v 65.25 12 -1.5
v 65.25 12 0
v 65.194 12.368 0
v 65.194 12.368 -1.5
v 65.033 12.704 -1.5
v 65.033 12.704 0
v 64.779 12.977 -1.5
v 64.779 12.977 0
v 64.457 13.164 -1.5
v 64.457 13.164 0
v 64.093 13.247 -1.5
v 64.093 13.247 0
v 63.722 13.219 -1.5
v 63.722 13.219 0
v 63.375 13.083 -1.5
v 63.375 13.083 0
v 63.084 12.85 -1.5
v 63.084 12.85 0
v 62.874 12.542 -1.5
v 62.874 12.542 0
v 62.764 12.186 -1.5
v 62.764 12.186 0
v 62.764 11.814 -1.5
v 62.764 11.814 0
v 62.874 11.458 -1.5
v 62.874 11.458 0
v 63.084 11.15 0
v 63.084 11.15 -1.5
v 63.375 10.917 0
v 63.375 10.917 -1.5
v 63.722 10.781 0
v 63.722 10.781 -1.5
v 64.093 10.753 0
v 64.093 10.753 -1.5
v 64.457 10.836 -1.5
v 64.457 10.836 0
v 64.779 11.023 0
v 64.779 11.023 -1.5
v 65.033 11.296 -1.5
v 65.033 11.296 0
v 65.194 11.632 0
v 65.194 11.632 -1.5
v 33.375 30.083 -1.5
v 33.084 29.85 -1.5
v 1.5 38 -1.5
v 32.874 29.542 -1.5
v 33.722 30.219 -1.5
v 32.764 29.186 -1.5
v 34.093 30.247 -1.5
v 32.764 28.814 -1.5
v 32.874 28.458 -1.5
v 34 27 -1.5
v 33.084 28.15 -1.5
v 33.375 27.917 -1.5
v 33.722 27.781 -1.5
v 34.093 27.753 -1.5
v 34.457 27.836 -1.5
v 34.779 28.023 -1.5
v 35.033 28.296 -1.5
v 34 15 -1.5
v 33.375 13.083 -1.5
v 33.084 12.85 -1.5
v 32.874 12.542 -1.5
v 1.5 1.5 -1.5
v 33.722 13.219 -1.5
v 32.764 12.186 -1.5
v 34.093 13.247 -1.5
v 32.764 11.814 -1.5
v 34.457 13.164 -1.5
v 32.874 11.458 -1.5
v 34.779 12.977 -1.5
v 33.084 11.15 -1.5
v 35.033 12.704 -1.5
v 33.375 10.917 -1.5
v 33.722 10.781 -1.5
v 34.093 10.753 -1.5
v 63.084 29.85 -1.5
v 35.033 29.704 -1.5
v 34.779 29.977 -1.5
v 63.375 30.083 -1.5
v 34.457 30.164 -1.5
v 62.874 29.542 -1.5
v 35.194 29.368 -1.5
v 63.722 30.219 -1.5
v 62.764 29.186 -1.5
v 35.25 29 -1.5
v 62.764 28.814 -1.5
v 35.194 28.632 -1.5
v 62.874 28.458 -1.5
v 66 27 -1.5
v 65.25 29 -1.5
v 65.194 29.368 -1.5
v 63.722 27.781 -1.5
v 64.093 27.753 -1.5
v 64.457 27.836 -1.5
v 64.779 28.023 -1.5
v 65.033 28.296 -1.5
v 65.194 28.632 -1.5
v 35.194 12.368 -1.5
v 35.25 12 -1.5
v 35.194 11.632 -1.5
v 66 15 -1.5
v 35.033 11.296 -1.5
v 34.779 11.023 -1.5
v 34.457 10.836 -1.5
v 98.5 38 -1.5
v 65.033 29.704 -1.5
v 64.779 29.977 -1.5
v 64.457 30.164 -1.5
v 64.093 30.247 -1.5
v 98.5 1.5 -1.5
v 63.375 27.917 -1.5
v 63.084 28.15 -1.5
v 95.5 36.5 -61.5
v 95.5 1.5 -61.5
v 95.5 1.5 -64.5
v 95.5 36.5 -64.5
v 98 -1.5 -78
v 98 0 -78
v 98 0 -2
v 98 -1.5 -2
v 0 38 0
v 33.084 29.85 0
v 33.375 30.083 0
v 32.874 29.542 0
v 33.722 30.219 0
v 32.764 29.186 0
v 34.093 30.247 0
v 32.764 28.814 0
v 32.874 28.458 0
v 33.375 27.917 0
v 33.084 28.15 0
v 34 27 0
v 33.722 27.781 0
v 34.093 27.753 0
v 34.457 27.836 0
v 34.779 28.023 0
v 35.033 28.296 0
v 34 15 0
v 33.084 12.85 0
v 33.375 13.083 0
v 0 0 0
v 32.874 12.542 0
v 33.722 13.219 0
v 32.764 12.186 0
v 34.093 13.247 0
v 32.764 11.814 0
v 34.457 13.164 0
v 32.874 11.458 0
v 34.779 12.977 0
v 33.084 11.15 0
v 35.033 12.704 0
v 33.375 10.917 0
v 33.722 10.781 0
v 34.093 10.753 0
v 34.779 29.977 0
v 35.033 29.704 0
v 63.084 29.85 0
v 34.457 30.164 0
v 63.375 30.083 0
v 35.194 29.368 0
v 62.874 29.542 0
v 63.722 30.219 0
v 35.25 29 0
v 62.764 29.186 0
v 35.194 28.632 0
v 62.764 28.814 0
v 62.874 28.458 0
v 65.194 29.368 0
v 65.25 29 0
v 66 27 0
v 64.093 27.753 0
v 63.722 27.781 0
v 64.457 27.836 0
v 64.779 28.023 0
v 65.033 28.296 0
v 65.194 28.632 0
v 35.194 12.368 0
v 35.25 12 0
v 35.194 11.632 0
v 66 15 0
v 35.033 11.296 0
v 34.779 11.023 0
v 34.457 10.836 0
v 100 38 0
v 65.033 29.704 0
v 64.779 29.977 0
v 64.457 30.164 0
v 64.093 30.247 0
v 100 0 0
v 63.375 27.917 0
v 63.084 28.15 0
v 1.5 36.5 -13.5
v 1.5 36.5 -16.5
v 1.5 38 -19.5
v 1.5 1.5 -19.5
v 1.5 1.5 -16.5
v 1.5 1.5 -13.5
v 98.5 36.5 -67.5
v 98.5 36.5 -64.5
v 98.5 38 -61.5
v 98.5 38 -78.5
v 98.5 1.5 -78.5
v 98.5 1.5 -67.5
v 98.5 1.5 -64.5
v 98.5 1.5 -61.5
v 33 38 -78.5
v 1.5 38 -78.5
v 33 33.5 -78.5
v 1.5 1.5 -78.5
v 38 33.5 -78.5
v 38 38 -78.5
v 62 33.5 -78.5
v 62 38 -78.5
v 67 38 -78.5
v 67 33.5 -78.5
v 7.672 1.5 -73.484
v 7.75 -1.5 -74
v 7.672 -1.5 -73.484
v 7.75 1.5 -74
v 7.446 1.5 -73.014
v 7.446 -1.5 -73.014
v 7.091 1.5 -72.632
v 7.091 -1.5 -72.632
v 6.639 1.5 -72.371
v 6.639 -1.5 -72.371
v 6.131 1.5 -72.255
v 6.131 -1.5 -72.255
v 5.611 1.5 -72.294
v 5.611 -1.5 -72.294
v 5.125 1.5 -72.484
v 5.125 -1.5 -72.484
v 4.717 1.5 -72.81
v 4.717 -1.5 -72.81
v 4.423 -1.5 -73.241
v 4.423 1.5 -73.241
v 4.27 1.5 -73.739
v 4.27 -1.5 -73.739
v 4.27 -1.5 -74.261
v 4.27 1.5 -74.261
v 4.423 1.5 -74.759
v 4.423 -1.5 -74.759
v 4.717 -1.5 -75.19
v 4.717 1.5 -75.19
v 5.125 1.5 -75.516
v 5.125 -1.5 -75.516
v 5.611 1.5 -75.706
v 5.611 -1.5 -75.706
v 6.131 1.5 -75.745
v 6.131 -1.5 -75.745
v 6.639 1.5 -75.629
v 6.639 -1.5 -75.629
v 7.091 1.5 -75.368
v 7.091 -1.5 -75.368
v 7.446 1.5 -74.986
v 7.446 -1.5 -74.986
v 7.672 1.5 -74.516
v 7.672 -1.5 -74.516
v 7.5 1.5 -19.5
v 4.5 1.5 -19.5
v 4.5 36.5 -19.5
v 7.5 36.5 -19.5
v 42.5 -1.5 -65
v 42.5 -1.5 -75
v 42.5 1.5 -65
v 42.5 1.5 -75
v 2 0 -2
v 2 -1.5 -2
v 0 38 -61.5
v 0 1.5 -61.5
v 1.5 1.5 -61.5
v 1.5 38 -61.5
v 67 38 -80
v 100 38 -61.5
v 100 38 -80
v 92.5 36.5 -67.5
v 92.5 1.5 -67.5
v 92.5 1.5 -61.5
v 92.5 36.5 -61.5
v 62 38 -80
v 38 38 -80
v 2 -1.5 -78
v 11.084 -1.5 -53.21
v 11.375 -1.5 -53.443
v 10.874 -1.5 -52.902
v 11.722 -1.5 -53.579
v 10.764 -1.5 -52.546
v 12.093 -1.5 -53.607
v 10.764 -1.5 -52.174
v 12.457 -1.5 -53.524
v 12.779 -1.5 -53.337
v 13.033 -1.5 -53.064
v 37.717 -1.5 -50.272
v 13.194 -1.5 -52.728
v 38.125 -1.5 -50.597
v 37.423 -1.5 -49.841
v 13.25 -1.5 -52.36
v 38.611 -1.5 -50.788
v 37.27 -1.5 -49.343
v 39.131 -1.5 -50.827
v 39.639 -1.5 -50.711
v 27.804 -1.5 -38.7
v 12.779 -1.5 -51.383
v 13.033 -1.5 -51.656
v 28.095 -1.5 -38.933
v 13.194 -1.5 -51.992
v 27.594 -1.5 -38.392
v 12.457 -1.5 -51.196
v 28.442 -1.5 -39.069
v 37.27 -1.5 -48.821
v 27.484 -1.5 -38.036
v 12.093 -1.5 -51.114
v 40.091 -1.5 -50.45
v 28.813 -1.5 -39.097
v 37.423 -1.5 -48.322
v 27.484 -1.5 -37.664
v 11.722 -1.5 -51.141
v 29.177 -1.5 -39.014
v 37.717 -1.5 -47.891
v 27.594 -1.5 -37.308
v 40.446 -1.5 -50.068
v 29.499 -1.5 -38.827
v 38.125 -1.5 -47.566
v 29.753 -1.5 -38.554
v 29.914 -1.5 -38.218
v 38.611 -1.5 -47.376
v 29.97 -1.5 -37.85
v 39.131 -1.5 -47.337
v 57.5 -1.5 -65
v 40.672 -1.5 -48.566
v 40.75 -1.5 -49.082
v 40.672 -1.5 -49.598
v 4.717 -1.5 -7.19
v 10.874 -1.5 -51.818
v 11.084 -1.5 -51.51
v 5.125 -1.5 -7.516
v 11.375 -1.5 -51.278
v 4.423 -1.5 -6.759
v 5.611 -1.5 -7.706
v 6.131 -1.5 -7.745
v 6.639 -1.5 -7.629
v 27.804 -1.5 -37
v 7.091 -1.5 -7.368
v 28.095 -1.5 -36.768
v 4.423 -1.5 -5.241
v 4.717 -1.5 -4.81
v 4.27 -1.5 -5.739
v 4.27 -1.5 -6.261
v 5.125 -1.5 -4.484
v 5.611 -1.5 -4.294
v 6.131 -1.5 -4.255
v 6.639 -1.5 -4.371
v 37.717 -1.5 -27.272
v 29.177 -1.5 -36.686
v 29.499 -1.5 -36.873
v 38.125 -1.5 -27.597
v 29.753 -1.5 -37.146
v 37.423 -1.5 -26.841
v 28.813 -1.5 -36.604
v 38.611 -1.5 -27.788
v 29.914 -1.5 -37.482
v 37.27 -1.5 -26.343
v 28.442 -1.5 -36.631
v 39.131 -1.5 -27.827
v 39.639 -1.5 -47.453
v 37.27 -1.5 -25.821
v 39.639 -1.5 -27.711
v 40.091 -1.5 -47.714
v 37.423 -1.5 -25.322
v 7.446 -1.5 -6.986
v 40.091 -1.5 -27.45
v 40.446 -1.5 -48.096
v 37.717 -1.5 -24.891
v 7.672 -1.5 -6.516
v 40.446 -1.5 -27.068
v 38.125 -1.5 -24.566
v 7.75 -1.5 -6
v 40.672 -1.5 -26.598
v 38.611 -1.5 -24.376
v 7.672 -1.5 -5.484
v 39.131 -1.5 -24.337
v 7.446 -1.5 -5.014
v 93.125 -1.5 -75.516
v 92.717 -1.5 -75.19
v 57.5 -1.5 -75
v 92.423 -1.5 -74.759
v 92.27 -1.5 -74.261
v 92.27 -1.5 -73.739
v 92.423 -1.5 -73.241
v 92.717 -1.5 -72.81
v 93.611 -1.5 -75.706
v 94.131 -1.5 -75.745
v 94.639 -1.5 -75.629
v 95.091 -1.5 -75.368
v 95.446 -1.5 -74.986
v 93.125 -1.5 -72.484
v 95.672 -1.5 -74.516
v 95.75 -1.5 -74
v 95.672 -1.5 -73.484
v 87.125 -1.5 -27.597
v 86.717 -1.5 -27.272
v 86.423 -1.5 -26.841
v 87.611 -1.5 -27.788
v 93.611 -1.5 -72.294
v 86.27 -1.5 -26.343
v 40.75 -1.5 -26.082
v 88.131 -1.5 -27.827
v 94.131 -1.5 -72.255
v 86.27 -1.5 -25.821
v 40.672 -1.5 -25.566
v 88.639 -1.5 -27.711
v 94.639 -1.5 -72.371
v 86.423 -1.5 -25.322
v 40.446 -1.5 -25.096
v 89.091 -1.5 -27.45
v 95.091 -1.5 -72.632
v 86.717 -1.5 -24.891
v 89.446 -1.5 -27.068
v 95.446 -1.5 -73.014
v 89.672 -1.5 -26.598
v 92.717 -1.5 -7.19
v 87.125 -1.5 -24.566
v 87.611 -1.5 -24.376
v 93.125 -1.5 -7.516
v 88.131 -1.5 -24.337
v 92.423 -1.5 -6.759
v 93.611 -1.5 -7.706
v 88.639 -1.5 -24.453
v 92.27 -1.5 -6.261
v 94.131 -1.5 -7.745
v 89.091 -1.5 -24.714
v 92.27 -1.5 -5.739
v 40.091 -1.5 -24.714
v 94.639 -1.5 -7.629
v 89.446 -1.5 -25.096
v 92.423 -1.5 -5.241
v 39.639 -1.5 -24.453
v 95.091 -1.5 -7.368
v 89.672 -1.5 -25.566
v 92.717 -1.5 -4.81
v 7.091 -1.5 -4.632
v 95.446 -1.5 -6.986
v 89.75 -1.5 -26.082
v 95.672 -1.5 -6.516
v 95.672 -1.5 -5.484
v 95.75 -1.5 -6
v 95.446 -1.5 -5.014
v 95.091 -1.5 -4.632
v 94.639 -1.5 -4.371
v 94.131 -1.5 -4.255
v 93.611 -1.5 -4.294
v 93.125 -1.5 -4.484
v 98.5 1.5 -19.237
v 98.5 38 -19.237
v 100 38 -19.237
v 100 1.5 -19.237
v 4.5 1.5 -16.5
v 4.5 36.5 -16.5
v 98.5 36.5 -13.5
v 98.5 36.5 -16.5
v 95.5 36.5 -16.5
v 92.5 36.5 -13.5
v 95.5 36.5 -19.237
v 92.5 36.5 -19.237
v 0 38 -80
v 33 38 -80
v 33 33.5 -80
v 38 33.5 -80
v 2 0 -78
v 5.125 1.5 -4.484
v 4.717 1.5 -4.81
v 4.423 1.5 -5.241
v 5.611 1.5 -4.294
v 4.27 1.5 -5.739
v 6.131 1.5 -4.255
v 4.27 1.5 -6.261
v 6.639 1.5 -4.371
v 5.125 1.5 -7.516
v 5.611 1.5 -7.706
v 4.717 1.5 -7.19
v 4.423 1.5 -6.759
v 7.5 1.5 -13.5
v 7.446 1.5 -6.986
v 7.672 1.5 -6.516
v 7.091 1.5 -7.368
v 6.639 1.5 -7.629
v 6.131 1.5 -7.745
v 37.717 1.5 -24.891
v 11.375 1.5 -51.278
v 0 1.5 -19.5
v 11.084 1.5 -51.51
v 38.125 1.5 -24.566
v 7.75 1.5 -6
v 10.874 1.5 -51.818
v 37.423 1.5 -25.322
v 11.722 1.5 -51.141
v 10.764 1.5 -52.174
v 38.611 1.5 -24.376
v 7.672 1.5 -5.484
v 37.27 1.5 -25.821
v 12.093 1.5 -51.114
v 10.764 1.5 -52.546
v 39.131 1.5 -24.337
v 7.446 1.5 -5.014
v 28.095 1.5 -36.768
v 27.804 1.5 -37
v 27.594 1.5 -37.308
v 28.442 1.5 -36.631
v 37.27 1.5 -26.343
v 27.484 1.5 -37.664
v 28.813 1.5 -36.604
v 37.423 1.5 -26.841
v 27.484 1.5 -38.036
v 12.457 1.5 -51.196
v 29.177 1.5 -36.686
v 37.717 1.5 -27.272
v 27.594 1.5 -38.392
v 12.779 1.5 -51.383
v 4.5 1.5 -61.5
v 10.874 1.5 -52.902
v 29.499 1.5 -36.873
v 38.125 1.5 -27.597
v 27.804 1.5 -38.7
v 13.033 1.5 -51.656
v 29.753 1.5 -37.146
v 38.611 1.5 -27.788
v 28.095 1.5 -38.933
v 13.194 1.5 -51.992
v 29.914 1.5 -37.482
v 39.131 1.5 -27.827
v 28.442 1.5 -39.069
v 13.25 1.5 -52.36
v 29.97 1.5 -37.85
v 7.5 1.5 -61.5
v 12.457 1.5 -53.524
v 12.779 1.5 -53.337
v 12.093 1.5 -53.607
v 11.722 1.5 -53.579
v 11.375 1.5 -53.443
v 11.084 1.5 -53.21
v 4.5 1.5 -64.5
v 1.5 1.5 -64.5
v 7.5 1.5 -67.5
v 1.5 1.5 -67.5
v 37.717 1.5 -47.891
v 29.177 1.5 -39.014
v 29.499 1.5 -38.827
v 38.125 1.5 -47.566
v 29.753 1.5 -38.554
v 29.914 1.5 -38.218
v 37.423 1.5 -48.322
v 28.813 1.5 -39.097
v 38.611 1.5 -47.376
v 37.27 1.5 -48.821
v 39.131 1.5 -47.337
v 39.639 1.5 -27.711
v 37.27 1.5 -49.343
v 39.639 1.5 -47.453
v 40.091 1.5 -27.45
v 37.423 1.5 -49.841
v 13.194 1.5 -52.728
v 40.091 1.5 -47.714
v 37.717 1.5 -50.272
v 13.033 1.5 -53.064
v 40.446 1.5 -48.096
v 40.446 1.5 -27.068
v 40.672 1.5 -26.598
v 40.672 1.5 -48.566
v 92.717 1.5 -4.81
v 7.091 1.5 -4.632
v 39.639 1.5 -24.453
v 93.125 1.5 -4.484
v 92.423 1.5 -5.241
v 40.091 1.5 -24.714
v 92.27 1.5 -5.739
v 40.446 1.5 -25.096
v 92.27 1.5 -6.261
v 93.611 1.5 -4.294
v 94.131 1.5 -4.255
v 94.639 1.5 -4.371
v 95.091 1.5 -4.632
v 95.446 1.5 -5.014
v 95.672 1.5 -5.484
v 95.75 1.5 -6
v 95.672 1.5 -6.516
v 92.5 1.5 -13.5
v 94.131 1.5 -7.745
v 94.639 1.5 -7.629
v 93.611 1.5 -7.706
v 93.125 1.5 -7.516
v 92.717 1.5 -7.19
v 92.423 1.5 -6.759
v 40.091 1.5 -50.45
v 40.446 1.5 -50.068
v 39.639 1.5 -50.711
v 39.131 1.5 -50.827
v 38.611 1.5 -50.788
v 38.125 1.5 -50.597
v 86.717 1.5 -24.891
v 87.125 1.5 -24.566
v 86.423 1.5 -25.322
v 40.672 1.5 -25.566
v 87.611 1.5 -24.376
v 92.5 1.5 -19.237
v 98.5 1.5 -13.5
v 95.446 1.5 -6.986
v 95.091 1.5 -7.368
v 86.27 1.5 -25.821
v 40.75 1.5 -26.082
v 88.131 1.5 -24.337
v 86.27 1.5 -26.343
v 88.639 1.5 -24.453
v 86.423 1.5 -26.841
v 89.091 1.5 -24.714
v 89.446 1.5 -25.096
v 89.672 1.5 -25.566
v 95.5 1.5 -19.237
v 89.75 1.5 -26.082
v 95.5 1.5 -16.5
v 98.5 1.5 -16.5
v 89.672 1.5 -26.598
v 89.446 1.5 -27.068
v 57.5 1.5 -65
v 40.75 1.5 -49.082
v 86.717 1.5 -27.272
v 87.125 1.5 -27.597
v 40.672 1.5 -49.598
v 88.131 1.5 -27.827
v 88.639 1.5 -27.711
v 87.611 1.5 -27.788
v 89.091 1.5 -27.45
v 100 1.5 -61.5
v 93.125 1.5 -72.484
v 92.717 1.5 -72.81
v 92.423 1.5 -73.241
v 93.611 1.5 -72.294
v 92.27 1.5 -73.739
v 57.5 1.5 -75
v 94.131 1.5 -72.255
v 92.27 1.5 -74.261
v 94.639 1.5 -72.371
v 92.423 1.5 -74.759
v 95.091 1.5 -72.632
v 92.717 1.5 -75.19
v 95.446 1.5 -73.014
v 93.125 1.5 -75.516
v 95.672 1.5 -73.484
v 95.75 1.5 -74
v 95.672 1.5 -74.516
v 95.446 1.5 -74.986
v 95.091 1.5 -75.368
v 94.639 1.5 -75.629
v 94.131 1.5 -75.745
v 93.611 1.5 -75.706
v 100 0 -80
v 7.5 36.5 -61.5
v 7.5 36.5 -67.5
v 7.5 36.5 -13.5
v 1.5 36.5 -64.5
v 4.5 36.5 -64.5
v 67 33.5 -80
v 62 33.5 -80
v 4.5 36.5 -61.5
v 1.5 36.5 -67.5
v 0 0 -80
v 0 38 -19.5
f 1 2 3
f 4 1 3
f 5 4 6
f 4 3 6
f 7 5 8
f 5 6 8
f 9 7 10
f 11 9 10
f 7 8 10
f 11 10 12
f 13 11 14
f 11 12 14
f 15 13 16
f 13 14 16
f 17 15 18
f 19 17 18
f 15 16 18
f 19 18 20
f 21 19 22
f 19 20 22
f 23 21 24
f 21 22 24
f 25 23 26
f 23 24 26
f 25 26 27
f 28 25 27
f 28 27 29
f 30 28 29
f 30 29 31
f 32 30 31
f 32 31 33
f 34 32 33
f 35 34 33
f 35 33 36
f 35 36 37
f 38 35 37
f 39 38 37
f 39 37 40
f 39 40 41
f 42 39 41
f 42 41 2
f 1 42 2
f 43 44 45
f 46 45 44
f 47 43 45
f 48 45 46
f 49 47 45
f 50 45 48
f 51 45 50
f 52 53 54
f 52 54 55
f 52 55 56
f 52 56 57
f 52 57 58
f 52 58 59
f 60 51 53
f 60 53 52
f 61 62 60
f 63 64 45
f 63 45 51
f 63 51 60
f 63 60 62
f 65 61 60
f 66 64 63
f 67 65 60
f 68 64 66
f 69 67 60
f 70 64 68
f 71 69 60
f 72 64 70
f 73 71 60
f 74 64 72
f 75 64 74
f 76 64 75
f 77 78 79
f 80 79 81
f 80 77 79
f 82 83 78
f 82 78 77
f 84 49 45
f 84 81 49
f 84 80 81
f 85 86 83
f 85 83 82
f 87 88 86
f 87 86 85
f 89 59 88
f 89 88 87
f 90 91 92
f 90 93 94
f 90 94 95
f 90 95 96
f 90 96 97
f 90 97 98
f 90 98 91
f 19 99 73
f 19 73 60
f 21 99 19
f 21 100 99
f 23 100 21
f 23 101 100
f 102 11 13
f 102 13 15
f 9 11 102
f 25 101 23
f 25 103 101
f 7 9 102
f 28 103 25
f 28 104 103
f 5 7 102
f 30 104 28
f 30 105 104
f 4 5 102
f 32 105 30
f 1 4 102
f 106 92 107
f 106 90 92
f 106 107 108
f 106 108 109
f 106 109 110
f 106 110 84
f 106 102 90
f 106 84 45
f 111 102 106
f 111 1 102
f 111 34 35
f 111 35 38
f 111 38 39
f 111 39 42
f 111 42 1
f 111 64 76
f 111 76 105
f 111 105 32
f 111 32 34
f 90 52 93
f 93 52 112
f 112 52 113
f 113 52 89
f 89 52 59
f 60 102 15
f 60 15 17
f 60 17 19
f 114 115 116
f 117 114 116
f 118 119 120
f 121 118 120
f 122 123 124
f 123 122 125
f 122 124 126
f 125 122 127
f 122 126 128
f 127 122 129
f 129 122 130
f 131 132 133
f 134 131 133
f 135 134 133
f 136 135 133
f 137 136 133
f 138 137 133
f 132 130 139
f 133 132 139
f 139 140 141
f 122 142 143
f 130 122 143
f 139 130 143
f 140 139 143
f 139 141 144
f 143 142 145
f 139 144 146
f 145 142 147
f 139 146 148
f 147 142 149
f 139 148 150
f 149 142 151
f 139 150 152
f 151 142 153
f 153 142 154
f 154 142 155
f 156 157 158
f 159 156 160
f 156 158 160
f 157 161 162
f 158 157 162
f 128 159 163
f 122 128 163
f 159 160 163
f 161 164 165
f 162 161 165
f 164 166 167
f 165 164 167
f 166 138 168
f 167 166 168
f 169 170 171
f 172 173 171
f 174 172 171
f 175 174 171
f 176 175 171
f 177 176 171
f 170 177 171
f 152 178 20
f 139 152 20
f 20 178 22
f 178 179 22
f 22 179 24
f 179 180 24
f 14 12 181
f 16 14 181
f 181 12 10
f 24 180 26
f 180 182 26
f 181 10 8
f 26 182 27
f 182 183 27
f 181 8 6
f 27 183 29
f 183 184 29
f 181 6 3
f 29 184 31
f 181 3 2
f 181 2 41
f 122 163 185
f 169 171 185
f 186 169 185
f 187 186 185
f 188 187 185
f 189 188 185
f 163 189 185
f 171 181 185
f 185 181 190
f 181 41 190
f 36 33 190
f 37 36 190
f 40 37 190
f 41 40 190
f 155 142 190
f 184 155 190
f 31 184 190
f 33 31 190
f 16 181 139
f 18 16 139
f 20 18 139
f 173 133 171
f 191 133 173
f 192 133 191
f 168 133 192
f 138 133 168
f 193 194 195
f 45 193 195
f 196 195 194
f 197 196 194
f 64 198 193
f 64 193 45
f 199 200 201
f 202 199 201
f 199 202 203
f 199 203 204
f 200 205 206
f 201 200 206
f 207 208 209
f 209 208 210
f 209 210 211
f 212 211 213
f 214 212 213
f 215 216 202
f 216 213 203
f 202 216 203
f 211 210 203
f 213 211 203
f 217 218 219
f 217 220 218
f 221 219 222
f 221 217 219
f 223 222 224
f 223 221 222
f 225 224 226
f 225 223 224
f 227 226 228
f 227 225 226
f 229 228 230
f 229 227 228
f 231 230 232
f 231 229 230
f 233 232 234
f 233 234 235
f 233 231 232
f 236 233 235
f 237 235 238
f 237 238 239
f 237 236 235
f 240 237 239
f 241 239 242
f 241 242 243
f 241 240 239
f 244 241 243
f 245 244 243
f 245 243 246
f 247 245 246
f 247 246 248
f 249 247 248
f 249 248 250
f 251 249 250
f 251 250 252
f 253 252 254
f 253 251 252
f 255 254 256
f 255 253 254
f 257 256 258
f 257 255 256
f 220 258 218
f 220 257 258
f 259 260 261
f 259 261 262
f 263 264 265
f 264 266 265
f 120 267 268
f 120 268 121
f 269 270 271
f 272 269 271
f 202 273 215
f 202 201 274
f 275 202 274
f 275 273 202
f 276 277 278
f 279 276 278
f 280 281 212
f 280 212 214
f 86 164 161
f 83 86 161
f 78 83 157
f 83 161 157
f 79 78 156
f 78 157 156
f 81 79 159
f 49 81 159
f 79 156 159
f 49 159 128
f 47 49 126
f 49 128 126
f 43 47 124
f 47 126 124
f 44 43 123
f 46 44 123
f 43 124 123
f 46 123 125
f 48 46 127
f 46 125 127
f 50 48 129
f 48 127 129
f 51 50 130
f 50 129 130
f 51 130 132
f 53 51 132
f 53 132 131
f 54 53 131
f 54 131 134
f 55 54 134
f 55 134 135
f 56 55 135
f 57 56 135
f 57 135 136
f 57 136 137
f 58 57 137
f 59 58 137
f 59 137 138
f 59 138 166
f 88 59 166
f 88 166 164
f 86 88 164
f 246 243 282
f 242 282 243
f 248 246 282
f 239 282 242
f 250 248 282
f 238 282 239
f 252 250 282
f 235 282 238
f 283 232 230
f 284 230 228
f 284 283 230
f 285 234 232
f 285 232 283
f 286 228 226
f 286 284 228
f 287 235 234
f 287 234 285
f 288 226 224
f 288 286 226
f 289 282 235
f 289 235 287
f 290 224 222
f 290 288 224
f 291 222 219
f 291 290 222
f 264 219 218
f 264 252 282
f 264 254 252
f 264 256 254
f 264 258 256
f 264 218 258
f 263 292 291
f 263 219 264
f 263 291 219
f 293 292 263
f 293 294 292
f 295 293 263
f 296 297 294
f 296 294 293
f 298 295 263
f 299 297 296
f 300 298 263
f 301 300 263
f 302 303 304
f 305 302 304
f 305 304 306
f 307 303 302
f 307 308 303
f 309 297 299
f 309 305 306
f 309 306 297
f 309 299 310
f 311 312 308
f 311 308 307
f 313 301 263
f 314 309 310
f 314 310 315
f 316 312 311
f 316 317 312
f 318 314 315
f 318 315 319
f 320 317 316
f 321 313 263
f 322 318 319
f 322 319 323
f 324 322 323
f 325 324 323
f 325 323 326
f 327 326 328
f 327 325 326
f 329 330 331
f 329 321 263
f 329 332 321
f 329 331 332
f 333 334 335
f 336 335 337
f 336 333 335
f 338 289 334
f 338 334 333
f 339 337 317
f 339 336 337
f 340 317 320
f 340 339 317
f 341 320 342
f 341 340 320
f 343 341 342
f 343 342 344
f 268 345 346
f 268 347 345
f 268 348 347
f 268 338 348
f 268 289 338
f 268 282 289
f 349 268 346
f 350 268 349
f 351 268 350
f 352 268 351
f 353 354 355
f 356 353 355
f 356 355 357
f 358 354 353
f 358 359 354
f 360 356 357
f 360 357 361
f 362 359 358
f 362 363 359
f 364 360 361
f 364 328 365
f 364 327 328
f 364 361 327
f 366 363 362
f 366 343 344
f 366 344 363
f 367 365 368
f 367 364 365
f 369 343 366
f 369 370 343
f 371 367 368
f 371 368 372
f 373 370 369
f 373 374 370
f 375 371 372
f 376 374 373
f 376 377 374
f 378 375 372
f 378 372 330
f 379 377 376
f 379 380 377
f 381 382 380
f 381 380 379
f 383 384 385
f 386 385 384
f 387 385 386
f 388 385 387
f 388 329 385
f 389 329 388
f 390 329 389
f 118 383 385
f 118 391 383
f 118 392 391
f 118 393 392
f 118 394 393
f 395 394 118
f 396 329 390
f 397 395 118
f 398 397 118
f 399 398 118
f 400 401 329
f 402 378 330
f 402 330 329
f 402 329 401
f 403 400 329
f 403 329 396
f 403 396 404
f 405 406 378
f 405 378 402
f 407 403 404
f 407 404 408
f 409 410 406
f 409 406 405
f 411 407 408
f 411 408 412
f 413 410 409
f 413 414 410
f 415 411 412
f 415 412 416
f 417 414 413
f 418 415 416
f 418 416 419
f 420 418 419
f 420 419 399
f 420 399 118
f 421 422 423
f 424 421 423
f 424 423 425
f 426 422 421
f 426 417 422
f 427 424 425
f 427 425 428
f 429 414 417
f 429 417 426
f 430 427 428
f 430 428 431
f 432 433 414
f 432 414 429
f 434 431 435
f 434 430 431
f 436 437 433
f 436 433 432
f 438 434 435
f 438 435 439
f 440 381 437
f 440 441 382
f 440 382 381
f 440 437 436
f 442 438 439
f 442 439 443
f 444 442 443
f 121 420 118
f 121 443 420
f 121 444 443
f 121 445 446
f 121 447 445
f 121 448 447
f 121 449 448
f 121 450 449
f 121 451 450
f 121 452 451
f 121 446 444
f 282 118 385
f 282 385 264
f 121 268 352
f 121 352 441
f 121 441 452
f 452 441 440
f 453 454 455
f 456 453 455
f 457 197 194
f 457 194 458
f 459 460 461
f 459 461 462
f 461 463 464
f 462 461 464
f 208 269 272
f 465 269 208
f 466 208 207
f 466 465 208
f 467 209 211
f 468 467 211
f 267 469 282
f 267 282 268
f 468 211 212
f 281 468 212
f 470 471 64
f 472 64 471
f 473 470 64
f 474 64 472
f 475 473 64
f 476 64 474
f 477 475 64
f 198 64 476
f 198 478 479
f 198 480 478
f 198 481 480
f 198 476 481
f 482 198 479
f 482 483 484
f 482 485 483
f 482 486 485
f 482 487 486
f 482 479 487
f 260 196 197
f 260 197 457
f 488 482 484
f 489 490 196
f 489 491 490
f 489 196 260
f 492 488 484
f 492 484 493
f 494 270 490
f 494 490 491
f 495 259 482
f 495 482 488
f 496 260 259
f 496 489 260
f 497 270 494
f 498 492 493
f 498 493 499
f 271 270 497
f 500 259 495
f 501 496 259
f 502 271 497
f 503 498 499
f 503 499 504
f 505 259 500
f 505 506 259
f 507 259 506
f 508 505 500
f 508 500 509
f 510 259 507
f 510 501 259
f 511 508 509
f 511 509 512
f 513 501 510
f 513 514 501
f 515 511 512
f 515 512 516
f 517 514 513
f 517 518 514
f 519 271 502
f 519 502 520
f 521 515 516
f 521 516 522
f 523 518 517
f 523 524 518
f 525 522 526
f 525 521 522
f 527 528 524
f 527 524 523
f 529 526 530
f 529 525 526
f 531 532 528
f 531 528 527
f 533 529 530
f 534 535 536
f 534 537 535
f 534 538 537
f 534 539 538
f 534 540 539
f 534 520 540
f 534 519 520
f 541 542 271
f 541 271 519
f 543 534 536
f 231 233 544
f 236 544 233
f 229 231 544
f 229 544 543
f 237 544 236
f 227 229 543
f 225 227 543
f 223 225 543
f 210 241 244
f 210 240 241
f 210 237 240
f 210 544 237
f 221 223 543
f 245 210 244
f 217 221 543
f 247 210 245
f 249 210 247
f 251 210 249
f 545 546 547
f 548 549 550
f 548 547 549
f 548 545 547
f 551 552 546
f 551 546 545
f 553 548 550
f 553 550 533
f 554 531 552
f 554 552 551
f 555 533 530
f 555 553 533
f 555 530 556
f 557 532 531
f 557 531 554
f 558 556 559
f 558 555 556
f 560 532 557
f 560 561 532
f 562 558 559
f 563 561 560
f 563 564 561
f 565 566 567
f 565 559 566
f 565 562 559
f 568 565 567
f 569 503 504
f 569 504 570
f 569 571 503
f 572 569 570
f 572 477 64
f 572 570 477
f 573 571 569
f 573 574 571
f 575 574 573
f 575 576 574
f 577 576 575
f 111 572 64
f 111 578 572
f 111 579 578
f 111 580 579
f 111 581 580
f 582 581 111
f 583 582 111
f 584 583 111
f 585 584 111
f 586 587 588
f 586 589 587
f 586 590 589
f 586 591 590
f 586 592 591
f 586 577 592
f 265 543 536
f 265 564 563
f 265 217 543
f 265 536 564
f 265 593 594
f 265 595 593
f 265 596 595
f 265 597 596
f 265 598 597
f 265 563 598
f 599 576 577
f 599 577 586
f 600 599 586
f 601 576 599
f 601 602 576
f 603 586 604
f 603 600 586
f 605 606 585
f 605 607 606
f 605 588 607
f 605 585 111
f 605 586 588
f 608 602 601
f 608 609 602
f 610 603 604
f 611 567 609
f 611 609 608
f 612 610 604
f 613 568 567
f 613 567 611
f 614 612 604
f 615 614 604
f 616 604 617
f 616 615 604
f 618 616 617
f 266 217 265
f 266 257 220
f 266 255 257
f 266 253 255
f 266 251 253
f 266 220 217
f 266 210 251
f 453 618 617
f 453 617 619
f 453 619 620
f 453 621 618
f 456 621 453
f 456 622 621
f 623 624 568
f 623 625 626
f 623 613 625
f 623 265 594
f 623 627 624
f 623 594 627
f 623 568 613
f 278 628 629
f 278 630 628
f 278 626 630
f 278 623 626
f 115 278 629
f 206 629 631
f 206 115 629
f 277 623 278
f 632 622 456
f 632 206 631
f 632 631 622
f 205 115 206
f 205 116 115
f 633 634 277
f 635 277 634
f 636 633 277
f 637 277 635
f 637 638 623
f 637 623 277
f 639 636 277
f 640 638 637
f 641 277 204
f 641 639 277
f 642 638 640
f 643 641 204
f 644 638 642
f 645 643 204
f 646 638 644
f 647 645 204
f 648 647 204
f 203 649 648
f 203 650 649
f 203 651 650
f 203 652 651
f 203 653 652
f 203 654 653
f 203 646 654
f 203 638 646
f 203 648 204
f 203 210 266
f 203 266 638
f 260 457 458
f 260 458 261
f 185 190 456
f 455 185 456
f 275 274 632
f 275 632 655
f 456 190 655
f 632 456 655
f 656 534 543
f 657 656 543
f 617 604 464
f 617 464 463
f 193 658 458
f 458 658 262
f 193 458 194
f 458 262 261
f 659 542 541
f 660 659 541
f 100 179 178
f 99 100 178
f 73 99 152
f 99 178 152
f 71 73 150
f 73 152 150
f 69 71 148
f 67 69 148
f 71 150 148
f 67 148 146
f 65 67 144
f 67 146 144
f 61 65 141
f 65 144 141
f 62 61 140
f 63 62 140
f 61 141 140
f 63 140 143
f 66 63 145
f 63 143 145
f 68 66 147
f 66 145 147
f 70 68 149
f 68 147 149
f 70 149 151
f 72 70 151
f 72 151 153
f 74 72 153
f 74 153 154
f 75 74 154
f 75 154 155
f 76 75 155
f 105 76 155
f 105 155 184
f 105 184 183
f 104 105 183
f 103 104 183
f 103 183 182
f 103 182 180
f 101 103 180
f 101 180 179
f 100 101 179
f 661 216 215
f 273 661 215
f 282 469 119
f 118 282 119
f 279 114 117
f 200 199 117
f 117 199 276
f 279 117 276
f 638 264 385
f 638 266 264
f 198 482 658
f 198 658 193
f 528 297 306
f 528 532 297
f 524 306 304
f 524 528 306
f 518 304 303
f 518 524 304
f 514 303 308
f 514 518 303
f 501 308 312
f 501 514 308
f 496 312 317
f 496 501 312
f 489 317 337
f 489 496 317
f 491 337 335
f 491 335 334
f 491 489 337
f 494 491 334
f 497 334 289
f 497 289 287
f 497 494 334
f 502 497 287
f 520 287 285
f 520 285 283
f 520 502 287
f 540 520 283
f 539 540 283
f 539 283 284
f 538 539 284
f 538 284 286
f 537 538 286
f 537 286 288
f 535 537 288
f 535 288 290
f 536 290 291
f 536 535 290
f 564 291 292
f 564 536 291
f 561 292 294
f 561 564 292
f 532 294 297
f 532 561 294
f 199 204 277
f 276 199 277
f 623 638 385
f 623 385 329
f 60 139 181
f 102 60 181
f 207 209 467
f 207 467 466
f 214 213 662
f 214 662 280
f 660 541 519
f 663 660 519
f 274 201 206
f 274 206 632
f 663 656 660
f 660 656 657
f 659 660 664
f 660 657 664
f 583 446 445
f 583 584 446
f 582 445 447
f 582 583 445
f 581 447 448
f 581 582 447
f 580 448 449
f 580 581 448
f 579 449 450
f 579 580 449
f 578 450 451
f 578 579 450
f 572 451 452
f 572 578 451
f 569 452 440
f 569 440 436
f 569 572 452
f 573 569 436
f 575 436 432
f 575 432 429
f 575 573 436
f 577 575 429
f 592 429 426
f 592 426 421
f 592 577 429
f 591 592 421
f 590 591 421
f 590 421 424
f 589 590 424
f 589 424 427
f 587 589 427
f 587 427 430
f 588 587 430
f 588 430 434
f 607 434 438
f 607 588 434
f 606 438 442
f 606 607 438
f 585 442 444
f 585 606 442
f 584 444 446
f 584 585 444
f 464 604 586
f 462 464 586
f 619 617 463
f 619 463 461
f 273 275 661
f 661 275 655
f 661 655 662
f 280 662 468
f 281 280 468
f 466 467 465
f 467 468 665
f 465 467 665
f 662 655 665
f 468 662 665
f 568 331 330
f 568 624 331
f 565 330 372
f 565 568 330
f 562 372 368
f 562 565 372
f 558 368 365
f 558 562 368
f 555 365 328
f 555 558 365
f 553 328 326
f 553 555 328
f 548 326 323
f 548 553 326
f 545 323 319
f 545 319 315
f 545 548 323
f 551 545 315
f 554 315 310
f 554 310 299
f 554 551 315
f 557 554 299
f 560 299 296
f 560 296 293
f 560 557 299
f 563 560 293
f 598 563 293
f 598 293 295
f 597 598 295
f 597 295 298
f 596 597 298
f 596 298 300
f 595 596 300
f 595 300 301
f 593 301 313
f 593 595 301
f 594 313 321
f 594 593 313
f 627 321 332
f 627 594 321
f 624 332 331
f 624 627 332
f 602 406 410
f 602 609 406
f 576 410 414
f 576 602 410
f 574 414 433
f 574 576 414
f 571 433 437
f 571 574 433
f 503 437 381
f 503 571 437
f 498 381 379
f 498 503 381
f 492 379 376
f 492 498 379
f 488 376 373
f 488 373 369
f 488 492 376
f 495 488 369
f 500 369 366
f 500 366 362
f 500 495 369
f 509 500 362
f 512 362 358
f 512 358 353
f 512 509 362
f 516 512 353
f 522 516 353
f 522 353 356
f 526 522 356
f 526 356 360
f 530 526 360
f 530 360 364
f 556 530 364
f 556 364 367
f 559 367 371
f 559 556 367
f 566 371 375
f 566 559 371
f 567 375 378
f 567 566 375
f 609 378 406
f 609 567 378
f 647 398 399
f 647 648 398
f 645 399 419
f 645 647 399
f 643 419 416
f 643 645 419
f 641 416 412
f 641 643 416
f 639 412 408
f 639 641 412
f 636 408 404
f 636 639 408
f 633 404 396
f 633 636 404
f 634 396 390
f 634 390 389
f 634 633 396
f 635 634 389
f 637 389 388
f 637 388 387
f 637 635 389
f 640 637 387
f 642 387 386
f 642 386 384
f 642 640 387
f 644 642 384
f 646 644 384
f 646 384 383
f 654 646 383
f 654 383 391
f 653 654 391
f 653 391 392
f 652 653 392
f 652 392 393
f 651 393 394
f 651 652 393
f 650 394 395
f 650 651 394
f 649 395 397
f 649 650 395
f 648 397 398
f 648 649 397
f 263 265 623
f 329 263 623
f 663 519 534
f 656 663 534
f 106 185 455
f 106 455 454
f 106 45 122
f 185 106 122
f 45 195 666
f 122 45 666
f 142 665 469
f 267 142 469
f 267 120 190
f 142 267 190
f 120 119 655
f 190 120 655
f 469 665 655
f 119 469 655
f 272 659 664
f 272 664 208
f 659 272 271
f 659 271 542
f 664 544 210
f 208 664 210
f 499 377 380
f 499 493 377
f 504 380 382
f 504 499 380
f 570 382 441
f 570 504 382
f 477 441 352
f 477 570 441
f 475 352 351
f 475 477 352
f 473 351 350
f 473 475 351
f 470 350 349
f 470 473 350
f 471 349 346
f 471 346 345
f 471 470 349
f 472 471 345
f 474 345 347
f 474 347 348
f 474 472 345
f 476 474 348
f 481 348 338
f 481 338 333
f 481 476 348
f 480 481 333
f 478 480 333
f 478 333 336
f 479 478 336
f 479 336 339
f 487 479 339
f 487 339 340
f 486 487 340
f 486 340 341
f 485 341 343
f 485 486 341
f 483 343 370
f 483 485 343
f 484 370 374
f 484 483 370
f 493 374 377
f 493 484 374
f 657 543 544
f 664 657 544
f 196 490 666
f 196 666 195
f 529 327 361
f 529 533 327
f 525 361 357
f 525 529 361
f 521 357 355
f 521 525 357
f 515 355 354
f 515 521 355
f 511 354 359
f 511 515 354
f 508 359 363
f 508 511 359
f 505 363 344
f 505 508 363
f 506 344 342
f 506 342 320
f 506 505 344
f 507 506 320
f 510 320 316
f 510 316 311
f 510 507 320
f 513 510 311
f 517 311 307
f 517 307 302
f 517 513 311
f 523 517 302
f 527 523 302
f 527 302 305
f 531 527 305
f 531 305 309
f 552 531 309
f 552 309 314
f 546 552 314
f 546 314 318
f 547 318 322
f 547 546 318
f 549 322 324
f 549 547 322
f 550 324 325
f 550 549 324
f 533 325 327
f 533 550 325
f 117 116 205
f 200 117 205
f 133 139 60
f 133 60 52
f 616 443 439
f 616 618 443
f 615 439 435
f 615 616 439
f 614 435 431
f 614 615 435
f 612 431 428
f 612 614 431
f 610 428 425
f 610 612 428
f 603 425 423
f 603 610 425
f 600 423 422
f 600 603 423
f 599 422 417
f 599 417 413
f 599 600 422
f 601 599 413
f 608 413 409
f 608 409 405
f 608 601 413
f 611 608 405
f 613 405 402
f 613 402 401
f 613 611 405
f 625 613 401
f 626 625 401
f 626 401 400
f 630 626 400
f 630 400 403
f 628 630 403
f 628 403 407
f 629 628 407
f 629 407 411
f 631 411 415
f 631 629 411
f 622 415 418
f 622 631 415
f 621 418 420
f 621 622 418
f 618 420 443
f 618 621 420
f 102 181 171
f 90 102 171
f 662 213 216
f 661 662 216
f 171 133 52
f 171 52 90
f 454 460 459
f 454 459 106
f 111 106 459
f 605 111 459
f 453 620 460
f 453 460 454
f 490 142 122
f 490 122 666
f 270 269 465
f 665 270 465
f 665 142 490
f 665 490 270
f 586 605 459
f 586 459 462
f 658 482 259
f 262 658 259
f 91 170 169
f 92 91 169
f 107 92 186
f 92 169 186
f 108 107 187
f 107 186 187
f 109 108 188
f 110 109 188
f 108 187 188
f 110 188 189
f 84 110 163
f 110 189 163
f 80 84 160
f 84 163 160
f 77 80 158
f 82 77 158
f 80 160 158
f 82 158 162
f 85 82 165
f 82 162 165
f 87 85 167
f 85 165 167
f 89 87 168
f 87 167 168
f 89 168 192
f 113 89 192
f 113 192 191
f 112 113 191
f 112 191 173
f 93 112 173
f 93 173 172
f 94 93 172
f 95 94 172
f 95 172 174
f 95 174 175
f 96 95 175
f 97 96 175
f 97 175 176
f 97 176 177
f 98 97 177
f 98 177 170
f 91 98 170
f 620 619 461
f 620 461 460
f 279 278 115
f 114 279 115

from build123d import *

# Parameters (mm, degrees)
ESQUISSE1_W             = 100
ESQUISSE1_H             = 80
ESQUISSE1_R             = 1.75
ESQUISSE1_R_2           = 1.25
ESQUISSE1_W_2           = 15
ESQUISSE1_H_2           = 10
BOSS_EXTRU_1_DEPTH      = 1.5
BOSS_EXTRU_2_DEPTH      = 36.5
ESQUISSE3_R             = 1.25
ESQUISSE3_W             = 32
ESQUISSE3_H             = 12
ENL_V_MAT_EXTRU_1_DEPTH = 5
ESQUISSE4_W             = 96
ESQUISSE4_H             = 76
ESQUISSE4_R             = 1.75
ESQUISSE4_R_2           = 1.25
ESQUISSE4_W_2           = 15
ESQUISSE4_H_2           = 10
BOSS_EXTRU_3_DEPTH      = 1.5
ENL_V_MAT_EXTRU_2_DEPTH = 1.5
ESQUISSE6_W             = 5
ESQUISSE6_H             = 4.5
ENL_V_MAT_EXTRU_3_DEPTH = 10


with BuildPart() as part:
    # Esquisse1 → Boss.-Extru.1 (new body)
    with BuildSketch(Plane(origin=(0, 0, 0), x_dir=(1, 0, 0), z_dir=(0, 1, 0))):
        with Locations((50, 40)):
            Rectangle(ESQUISSE1_W, ESQUISSE1_H)
        with Locations((6, 74)):
            Circle(ESQUISSE1_R, mode=Mode.SUBTRACT)
        with Locations((94, 74)):
            Circle(ESQUISSE1_R, mode=Mode.SUBTRACT)
        with Locations((94, 6)):
            Circle(ESQUISSE1_R, mode=Mode.SUBTRACT)
        with Locations((6, 6)):
            Circle(ESQUISSE1_R, mode=Mode.SUBTRACT)
        with Locations((88, 26.081709878)):
            Circle(ESQUISSE1_R, mode=Mode.SUBTRACT)
        with Locations((39, 26.081709878)):
            Circle(ESQUISSE1_R, mode=Mode.SUBTRACT)
        with Locations((39, 49.081709878)):
            Circle(ESQUISSE1_R, mode=Mode.SUBTRACT)
        with Locations((28.72, 37.850032574)):
            Circle(ESQUISSE1_R_2, mode=Mode.SUBTRACT)
        with Locations((12, 52.360032574)):
            Circle(ESQUISSE1_R_2, mode=Mode.SUBTRACT)
        with Locations((50, 70)):
            Rectangle(ESQUISSE1_W_2, ESQUISSE1_H_2, mode=Mode.SUBTRACT)
    extrude(amount=BOSS_EXTRU_1_DEPTH)

    # Esquisse2 → Boss.-Extru.2 (add)
    with BuildSketch(Plane(origin=(0, 1.5, 0), x_dir=(1, 0, 0), z_dir=(0, 1, 0))):
        Polygon((1.5, 78.5), (98.5, 78.5), (98.5, 67.5), (92.5, 67.5), (92.5, 64.5), (92.5, 61.5), (95.5, 61.5), (95.5, 64.5), (98.5, 64.5), (98.5, 61.5), (100, 61.5), (100, 80), (0, 80), (0, 61.5), (1.5, 61.5), (1.5, 64.5), (4.5, 64.5), (4.5, 61.5), (7.5, 61.5), (7.5, 64.5), (7.5, 67.5), (1.5, 67.5), align=None)
        Polygon((1.5, 1.5), (98.5, 1.5), (98.5, 13.5), (92.5, 13.5), (92.5, 16.5), (92.5, 19.237081293), (95.5, 19.237081293), (95.5, 16.5), (98.5, 16.5), (98.5, 19.237081293), (100, 19.237081293), (100, 0), (0, 0), (0, 19.5), (1.5, 19.5), (1.5, 16.5), (4.5, 16.5), (4.5, 19.5), (7.5, 19.5), (7.5, 16.5), (7.5, 13.5), (1.5, 13.5), align=None)
    extrude(amount=BOSS_EXTRU_2_DEPTH)

    # Esquisse3 → Enlèv. mat.-Extru.1 (cut)
    with BuildSketch(Plane.XY):
        with Locations((34, 29)):
            Circle(ESQUISSE3_R)
        with Locations((34, 12)):
            Circle(ESQUISSE3_R)
        with Locations((64, 12)):
            Circle(ESQUISSE3_R)
        with Locations((64, 29)):
            Circle(ESQUISSE3_R)
        with Locations((50, 21)):
            Rectangle(ESQUISSE3_W, ESQUISSE3_H)
    extrude(amount=-ENL_V_MAT_EXTRU_1_DEPTH, mode=Mode.SUBTRACT)

    # Esquisse4 → Boss.-Extru.3 (add)
    with BuildSketch(Plane.XZ):
        with Locations((50, -40)):
            Rectangle(ESQUISSE4_W, ESQUISSE4_H)
        with Locations((6, -6)):
            Circle(ESQUISSE4_R, mode=Mode.SUBTRACT)
        with Locations((6, -74)):
            Circle(ESQUISSE4_R, mode=Mode.SUBTRACT)
        with Locations((94, -74)):
            Circle(ESQUISSE4_R, mode=Mode.SUBTRACT)
        with Locations((94, -6)):
            Circle(ESQUISSE4_R, mode=Mode.SUBTRACT)
        with Locations((88, -26.081709878)):
            Circle(ESQUISSE4_R, mode=Mode.SUBTRACT)
        with Locations((39, -49.081709878)):
            Circle(ESQUISSE4_R, mode=Mode.SUBTRACT)
        with Locations((39, -26.081709878)):
            Circle(ESQUISSE4_R, mode=Mode.SUBTRACT)
        with Locations((28.72, -37.850032574)):
            Circle(ESQUISSE4_R_2, mode=Mode.SUBTRACT)
        with Locations((12, -52.360032574)):
            Circle(ESQUISSE4_R_2, mode=Mode.SUBTRACT)
        with Locations((50, -70)):
            Rectangle(ESQUISSE4_W_2, ESQUISSE4_H_2, mode=Mode.SUBTRACT)
    extrude(amount=BOSS_EXTRU_3_DEPTH)

    # Esquisse5 → Enlèv. mat.-Extru.2 (cut)
    with BuildSketch(Plane(origin=(0, 38, 0), x_dir=(1, 0, 0), z_dir=(0, 1, 0))):
        Polygon((1.5, 67.5), (7.5, 67.5), (7.5, 64.5), (7.5, 61.5), (4.5, 61.5), (4.5, 64.5), (1.5, 64.5), align=None)
        Polygon((1.5, 16.5), (4.5, 16.5), (4.5, 19.5), (7.5, 19.5), (7.5, 16.503082132), (7.5, 13.5), (1.5, 13.5), align=None)
        Polygon((92.5, 19.237081293), (95.5, 19.237081293), (95.5, 16.5), (98.5, 16.5), (98.5, 13.5), (92.5, 13.5), align=None)
        Polygon((95.5, 61.5), (92.5, 61.5), (92.5, 67.5), (95.5, 67.5), (98.5, 67.5), (98.5, 64.5), (95.5, 64.5), align=None)
    extrude(amount=-ENL_V_MAT_EXTRU_2_DEPTH, mode=Mode.SUBTRACT)

    # Esquisse6 → Enlèv. mat.-Extru.3 (cut)
    with BuildSketch(Plane.XY.offset(-78.5)):
        with Locations((35.5, 35.75)):
            Rectangle(ESQUISSE6_W, ESQUISSE6_H)
        with Locations((64.5, 35.75)):
            Rectangle(ESQUISSE6_W, ESQUISSE6_H)
    extrude(amount=-ENL_V_MAT_EXTRU_3_DEPTH, mode=Mode.SUBTRACT)


solid = part.part
